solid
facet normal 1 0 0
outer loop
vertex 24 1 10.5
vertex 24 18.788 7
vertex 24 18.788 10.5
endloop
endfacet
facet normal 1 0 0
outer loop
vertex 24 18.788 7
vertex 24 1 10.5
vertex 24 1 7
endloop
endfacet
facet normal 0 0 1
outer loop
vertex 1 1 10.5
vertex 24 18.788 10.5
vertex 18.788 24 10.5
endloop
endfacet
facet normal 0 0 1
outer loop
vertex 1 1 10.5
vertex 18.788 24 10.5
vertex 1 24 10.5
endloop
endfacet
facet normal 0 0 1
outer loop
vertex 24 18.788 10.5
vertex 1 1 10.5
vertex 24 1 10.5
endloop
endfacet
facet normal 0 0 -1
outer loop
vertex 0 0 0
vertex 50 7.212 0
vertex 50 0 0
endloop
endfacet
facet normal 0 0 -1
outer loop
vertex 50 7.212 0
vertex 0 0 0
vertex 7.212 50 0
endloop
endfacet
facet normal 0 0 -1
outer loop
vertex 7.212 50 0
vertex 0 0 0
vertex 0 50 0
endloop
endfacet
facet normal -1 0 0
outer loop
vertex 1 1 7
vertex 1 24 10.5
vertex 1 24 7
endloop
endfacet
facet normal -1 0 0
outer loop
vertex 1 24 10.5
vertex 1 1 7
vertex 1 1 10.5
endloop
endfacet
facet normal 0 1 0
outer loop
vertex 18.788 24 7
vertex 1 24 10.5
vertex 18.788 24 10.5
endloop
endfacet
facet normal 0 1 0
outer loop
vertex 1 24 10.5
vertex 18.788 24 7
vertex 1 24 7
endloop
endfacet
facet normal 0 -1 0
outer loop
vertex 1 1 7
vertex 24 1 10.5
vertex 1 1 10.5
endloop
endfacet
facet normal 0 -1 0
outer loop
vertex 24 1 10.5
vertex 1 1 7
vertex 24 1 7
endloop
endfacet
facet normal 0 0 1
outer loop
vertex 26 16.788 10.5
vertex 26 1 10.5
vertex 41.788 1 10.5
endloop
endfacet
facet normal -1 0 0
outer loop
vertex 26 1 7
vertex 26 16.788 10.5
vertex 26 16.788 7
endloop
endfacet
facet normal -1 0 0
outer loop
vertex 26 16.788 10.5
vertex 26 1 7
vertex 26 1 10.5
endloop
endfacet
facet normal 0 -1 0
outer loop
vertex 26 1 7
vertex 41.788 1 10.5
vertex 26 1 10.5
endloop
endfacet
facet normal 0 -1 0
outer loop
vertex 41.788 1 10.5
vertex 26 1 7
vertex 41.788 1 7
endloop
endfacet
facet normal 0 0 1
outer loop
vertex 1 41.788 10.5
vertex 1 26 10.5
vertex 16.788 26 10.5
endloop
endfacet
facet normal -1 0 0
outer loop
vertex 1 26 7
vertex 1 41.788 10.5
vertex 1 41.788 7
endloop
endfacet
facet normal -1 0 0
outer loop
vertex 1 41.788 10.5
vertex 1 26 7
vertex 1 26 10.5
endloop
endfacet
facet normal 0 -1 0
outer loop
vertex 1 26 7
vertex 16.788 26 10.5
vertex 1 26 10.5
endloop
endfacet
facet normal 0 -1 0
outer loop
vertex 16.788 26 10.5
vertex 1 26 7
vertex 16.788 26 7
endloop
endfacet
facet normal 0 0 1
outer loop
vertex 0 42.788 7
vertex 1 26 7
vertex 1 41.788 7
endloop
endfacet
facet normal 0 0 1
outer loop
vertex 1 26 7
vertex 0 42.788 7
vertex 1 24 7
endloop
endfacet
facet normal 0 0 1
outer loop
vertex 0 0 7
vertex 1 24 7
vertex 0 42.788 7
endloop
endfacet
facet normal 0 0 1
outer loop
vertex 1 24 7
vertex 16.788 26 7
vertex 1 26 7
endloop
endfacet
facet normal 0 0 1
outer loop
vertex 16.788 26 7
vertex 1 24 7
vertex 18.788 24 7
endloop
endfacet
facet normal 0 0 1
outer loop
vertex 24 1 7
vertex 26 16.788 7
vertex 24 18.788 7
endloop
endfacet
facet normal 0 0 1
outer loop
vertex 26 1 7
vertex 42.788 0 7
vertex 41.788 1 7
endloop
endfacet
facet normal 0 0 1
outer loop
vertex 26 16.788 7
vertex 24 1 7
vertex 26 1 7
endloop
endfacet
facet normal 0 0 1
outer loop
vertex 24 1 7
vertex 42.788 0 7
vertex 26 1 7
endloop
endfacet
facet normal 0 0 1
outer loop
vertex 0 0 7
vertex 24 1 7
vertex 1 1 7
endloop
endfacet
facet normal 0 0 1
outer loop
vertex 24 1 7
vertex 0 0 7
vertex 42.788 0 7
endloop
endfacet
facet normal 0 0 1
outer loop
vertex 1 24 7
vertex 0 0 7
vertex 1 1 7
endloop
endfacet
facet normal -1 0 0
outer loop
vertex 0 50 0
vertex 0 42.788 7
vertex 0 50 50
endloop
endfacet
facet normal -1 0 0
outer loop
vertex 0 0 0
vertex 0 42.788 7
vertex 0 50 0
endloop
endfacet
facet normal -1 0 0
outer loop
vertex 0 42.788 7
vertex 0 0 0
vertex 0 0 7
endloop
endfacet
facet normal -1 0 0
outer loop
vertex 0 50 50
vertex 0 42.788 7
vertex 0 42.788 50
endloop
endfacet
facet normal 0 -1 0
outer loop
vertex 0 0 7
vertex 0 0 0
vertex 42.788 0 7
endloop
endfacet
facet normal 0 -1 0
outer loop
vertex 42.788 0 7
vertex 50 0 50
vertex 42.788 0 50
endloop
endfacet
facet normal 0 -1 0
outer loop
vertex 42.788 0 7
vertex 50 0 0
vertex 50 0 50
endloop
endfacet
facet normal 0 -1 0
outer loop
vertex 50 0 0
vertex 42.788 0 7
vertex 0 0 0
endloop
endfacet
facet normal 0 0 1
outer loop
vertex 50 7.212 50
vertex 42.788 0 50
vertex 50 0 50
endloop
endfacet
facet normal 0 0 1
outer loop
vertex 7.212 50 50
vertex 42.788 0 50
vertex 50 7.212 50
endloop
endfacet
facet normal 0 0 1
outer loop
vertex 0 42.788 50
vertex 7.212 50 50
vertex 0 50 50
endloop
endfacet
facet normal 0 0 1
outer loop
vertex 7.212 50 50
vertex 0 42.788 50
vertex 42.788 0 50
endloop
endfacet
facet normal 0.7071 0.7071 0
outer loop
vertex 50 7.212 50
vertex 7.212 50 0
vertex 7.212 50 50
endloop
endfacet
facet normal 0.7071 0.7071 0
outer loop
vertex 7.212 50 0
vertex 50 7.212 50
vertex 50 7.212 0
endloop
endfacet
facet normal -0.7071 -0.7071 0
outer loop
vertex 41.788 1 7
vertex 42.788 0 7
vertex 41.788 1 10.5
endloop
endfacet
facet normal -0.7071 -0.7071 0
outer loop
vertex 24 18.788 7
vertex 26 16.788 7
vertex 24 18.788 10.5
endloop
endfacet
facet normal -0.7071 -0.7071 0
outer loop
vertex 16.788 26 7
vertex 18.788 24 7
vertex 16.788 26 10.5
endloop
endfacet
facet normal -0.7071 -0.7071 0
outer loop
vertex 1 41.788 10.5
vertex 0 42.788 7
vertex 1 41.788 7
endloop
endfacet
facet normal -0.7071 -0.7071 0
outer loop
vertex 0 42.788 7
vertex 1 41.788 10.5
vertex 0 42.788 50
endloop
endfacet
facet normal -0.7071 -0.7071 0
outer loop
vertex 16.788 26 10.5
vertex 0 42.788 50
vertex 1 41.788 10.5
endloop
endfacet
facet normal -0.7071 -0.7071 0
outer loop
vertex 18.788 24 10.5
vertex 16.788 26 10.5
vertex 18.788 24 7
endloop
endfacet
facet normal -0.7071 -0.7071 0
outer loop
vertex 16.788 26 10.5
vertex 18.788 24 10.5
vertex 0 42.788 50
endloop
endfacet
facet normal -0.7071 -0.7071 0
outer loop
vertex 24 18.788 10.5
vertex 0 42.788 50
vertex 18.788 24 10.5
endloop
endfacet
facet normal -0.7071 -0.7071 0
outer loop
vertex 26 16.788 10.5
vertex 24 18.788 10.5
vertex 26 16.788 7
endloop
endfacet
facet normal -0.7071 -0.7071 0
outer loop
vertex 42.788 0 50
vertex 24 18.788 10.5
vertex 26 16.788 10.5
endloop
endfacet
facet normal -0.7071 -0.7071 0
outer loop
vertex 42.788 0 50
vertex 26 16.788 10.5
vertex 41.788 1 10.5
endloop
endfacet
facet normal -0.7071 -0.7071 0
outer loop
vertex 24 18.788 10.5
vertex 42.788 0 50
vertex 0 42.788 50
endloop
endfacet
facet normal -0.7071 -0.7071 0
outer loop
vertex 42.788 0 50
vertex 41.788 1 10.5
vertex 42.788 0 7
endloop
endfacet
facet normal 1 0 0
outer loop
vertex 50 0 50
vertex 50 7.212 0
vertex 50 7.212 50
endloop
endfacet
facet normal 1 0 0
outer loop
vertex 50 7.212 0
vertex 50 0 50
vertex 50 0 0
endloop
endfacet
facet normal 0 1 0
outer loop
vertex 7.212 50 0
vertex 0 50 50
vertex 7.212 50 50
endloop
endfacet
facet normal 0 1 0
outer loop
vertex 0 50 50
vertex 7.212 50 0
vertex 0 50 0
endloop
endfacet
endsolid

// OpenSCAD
color("LightGray") {
    difference () {
        union() {
            translate([1,1,0]) cube([23,23,6+4.5]);
            translate([25+1,1,0]) cube([23,23,6+4.5]);
            translate([1,25+1,0]) cube([23,23,6+4.5]);
            translate([25+1,25+1,0]) cube([23,23,6+4.5]);
        }
        translate([50,0,-1]) rotate([0,0,45]) cube([75,75,50]);
    }
}
color("Grey") {
    difference() {
        cube([50,50,6+1]);
        translate([50,0,-1]) rotate([0,0,45]) cube([75,75,50]);
    }
    intersection() {
        translate([50+sqrt(10.2*10.2*2)/2,0,0]) rotate([0,0,90+45]) cube([80,10.2,50]);
        cube([50,50,50]);
    }
}
